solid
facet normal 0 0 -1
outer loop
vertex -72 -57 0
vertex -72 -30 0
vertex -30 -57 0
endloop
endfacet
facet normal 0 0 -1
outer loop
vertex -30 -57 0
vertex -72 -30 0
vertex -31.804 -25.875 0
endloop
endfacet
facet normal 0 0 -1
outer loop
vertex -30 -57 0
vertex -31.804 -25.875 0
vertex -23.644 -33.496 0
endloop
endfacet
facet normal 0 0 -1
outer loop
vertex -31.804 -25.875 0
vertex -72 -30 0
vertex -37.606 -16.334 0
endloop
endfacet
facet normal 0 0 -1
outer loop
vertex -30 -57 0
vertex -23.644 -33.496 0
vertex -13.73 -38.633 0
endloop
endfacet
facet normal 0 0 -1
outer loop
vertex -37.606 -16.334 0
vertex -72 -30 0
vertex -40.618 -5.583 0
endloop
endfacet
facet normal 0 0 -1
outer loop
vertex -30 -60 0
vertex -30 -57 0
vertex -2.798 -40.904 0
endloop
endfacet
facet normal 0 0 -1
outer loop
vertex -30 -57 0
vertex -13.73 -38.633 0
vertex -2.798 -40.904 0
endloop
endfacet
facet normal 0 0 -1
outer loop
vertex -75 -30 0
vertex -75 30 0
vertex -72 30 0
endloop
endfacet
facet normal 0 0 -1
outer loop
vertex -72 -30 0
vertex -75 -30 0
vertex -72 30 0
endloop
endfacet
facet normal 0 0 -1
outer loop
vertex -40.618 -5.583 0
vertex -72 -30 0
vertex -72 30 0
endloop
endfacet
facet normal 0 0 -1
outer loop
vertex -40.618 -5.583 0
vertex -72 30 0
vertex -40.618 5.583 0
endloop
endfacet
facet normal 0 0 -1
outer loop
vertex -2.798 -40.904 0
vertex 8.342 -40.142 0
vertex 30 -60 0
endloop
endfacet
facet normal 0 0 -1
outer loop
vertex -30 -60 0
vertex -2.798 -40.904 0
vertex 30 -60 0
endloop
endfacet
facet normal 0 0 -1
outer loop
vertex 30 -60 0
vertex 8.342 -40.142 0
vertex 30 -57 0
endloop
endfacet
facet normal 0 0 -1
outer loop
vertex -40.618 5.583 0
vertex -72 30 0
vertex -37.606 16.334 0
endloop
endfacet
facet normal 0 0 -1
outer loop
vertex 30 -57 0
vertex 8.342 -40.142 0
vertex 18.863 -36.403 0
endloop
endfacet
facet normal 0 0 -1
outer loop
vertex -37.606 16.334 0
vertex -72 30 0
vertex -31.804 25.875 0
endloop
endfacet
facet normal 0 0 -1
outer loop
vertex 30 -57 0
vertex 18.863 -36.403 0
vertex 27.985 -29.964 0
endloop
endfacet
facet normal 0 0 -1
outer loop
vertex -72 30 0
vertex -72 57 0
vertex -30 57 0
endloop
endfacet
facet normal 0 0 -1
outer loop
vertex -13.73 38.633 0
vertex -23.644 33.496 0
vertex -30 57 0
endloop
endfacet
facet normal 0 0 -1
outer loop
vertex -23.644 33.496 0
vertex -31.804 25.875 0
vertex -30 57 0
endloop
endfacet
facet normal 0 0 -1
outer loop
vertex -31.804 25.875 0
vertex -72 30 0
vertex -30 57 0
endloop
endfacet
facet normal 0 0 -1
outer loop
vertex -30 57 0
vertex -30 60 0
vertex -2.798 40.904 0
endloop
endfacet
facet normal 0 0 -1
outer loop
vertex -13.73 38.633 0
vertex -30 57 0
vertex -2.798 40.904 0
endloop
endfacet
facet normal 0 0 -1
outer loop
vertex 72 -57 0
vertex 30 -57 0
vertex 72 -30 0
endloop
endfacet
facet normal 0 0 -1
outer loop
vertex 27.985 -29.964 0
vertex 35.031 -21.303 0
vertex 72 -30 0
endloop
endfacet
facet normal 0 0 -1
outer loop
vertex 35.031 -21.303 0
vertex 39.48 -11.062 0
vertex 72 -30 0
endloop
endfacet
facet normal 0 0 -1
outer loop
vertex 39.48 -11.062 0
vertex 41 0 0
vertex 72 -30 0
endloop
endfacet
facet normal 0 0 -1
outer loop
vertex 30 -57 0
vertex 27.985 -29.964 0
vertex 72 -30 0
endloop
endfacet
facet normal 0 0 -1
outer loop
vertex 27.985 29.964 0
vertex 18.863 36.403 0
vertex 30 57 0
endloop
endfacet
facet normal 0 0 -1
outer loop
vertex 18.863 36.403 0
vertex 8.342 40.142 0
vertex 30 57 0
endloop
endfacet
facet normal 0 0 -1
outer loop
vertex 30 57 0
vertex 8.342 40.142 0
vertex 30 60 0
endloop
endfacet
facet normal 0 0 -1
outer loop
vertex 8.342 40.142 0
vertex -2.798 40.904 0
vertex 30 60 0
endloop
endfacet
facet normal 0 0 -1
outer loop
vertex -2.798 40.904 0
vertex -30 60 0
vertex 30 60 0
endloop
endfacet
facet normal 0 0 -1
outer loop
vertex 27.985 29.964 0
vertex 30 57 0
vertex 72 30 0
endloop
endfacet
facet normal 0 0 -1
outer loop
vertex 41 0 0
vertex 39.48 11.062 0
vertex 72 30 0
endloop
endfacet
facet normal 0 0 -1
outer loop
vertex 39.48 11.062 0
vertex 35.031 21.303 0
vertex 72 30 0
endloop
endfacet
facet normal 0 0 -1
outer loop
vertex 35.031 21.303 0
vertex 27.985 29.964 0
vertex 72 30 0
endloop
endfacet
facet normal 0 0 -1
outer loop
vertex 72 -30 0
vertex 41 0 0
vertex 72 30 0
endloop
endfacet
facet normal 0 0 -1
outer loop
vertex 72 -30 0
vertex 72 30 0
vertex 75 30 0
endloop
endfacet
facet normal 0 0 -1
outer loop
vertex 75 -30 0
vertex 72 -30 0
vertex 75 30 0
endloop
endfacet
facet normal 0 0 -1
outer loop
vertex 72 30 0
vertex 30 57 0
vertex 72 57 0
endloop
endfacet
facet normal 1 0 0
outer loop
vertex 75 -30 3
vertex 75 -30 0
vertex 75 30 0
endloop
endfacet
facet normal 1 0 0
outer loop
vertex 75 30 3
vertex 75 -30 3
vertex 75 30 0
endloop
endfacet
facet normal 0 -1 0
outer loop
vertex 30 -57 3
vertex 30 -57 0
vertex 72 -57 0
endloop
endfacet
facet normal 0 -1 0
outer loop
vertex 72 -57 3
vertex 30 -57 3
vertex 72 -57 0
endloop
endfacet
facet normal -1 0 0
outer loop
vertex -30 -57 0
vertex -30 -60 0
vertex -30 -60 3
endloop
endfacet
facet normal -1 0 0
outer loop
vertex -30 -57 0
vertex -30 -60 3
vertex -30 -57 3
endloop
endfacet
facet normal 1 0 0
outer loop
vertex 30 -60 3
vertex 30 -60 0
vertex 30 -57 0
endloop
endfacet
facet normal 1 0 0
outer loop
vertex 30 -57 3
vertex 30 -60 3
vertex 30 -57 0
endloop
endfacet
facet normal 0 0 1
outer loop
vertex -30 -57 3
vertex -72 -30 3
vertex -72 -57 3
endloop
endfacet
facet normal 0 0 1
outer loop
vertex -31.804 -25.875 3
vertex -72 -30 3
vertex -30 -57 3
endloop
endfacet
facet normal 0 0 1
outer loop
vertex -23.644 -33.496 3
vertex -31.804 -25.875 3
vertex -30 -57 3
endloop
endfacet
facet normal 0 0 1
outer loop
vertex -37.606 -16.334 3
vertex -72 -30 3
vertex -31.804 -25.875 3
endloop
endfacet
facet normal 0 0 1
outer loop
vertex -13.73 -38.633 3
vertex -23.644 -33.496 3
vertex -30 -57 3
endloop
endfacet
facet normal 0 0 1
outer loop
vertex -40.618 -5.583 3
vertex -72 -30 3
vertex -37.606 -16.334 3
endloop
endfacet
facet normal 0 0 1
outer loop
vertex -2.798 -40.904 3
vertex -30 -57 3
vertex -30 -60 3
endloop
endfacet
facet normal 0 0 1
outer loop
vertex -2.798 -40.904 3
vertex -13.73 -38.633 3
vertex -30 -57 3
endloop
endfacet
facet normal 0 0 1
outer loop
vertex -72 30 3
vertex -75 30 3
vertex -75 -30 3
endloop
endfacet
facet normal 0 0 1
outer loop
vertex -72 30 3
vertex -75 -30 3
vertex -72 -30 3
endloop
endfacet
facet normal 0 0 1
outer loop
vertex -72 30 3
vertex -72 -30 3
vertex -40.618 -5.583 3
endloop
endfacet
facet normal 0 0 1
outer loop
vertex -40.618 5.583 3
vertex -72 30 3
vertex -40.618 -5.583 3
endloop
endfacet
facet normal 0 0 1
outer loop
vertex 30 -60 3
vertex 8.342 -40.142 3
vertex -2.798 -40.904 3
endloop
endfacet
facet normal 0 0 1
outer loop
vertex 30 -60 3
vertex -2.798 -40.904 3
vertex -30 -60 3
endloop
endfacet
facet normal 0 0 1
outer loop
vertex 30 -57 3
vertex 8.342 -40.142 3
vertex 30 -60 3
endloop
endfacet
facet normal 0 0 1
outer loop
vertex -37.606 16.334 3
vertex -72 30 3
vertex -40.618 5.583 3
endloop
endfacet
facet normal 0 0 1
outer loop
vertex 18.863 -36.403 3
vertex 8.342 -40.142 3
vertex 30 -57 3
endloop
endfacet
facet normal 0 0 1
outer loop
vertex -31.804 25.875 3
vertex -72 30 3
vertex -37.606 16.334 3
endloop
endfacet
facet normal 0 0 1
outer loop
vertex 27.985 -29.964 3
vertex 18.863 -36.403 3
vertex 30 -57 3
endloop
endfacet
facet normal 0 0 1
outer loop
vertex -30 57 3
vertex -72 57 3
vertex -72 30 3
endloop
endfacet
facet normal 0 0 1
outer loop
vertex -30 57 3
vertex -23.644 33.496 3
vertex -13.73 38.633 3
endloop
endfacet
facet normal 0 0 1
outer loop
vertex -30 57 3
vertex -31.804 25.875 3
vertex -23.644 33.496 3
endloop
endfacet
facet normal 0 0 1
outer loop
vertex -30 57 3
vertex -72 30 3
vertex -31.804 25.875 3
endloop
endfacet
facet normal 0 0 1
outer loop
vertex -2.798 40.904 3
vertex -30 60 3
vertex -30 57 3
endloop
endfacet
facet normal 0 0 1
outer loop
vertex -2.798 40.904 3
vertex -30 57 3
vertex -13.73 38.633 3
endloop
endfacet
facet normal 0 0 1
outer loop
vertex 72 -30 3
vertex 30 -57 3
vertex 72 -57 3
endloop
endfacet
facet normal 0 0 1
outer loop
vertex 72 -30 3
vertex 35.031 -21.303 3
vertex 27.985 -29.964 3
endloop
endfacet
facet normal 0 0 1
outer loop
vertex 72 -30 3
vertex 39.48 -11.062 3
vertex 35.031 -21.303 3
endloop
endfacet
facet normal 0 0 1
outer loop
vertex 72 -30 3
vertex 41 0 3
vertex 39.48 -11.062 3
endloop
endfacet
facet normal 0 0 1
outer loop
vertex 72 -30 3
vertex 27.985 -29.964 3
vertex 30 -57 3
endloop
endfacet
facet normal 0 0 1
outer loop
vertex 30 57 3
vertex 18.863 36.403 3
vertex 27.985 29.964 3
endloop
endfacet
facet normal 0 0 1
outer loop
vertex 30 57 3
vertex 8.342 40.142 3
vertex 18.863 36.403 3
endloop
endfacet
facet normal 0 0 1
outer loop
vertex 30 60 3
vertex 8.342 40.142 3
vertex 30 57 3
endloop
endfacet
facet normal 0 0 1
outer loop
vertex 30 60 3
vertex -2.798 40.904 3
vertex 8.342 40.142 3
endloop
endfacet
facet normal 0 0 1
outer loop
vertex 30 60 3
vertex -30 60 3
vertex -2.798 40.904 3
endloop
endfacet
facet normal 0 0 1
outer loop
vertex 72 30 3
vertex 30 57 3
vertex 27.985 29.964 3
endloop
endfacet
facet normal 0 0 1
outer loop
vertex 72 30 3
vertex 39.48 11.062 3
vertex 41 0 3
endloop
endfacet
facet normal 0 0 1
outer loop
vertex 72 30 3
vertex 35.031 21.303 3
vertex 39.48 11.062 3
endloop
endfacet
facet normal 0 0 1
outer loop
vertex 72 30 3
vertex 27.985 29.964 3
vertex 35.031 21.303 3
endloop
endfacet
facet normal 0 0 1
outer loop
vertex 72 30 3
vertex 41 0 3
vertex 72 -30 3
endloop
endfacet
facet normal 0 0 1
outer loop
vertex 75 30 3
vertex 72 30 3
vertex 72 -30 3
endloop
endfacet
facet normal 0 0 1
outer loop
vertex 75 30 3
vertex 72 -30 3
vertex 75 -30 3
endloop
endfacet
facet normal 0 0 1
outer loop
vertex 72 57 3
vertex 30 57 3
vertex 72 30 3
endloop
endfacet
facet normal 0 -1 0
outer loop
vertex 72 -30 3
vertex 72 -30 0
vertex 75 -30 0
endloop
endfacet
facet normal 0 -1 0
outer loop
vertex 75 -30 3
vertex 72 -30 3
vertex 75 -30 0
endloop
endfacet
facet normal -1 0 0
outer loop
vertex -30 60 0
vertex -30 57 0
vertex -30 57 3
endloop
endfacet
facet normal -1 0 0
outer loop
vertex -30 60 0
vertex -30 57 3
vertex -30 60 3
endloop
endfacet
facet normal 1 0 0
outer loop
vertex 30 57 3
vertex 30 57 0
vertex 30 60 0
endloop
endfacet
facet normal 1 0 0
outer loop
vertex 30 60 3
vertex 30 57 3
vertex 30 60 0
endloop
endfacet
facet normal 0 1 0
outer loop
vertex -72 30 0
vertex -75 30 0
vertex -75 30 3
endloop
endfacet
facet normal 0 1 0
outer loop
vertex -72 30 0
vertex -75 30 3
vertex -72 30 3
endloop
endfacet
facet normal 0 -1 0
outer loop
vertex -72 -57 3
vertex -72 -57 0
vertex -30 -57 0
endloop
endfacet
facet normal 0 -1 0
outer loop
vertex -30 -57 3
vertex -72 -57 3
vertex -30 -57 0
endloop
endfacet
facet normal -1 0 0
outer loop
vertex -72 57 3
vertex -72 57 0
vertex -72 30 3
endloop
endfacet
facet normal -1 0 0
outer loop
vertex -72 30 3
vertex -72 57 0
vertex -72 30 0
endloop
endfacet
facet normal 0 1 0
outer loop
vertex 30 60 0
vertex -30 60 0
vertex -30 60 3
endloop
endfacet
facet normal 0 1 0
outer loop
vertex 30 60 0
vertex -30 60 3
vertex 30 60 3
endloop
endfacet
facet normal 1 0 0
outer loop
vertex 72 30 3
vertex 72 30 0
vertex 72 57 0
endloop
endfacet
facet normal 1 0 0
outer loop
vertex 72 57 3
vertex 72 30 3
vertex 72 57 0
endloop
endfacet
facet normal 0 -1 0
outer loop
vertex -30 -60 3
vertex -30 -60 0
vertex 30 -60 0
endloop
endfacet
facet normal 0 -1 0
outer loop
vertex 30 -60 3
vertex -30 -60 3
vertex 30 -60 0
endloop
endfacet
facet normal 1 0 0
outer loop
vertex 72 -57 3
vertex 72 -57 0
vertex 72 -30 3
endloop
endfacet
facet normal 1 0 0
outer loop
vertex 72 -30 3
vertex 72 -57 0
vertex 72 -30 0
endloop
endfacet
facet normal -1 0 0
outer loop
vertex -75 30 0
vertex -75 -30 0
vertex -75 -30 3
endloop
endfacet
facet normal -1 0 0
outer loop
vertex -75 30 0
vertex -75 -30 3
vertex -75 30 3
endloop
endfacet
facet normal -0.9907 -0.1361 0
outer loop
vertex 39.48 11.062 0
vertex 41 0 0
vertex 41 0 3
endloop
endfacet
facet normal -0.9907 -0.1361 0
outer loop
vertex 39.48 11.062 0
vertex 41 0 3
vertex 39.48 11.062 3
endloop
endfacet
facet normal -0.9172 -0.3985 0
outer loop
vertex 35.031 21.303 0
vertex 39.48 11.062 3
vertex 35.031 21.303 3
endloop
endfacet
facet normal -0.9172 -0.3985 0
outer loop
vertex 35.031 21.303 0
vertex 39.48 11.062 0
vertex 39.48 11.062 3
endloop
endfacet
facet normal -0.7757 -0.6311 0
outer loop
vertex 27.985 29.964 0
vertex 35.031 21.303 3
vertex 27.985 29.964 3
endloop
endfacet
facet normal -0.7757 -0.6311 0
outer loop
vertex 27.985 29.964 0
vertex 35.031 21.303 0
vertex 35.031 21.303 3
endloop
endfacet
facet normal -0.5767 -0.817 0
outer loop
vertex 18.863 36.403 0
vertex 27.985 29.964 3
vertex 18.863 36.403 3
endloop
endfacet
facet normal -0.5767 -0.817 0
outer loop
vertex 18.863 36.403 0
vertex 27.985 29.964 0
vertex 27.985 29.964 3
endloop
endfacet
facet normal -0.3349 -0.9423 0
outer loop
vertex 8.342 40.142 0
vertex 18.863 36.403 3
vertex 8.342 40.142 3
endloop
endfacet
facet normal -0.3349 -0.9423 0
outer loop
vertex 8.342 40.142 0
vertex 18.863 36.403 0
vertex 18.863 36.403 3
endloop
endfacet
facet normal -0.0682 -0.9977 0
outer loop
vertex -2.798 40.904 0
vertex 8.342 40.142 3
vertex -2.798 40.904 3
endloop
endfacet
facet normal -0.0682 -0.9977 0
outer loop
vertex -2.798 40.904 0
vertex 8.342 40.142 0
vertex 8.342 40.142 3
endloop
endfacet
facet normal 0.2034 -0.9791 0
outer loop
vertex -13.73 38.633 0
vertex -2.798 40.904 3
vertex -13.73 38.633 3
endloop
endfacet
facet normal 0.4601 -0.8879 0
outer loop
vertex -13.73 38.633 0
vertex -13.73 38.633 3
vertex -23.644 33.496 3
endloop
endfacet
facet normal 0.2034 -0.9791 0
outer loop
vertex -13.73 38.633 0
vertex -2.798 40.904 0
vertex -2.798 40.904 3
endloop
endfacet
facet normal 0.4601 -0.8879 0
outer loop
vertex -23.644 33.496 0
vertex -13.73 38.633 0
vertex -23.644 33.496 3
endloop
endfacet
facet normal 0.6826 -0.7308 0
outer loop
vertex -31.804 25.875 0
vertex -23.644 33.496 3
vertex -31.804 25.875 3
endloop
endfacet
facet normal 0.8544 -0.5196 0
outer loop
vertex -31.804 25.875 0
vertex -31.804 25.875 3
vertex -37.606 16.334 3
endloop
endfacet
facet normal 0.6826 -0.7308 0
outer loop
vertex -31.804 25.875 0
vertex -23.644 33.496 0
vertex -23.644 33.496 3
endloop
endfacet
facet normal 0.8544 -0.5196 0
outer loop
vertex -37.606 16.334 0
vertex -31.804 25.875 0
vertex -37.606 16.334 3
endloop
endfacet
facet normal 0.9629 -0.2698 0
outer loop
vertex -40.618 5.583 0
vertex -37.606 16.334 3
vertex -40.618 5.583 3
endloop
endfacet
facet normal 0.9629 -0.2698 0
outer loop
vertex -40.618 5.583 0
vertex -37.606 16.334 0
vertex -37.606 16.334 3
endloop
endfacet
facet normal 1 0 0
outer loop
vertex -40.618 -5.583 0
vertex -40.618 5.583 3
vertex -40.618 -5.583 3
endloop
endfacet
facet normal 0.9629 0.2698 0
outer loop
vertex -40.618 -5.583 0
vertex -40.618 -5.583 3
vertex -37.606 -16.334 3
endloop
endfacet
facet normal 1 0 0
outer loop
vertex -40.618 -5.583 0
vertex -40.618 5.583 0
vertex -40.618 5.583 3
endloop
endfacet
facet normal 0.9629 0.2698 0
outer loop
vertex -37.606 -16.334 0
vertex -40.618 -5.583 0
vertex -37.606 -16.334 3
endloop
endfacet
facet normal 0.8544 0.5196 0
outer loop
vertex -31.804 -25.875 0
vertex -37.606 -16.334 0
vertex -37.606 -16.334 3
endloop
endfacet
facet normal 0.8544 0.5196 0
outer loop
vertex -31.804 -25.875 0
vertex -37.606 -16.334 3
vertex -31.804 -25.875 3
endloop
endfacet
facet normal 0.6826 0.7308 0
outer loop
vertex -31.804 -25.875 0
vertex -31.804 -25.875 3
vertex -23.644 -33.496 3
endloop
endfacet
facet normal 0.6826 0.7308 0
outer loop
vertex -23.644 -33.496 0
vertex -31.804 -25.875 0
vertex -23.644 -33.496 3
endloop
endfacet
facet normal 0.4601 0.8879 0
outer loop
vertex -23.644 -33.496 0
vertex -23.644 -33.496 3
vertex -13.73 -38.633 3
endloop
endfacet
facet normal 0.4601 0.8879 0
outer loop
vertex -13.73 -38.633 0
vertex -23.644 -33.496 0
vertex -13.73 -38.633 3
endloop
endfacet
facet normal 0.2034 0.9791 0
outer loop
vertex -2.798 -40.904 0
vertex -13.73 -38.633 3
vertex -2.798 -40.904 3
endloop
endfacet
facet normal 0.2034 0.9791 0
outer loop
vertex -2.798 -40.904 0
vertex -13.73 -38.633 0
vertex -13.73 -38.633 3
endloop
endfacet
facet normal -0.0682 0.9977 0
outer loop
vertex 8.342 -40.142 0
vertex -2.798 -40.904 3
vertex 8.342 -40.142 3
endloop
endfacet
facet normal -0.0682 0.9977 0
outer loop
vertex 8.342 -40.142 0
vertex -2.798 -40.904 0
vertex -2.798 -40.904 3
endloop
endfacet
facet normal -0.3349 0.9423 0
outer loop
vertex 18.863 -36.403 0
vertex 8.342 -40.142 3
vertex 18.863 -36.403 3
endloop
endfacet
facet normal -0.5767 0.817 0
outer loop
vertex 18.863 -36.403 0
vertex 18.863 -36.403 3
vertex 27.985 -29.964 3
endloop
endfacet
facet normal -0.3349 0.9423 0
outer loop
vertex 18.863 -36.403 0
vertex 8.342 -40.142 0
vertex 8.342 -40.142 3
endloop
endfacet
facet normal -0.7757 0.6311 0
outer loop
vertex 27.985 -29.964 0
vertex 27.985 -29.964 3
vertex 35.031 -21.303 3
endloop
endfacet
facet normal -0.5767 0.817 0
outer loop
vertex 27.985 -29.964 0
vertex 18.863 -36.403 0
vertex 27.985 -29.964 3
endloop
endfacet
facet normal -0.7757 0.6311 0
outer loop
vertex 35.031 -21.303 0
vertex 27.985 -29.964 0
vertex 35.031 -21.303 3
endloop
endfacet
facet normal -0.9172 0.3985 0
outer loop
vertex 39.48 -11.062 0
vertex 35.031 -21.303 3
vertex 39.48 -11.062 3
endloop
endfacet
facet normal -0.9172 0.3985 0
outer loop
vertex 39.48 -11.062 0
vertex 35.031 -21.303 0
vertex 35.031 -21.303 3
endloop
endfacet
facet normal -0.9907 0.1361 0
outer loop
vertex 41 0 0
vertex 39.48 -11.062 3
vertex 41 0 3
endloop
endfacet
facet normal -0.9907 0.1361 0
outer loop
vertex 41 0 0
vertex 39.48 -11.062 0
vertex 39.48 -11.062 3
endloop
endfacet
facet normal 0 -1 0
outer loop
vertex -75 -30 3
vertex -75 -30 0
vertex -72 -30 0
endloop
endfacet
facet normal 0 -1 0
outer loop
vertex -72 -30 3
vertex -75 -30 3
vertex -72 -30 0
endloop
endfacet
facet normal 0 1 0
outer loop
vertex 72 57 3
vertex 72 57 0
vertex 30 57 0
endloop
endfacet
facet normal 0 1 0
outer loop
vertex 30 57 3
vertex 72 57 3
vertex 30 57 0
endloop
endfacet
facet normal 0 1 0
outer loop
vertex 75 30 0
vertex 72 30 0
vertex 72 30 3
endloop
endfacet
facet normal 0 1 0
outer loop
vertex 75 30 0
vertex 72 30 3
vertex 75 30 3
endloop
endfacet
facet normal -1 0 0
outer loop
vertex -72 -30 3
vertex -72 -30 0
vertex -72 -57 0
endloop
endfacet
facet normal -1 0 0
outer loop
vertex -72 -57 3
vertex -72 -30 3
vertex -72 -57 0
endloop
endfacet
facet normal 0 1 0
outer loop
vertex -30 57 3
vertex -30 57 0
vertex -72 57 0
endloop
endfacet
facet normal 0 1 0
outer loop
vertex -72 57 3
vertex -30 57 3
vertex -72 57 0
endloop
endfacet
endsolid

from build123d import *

# Parameters (mm, degrees)
F0_R     = 41
F0_W     = 60
F0_H     = 3
F0_W_2   = 3
F0_H_2   = 60
F1_DEPTH = 3


with BuildPart() as f1:
    # F0 (on Top) → F1 (new body)
    with BuildSketch(Plane.XY):
        Polygon((72, 30), (72, 57), (30, 57), (-30, 57), (-72, 57), (-72, 30), (-72, -30), (-72, -57), (-30, -57), (30, -57), (72, -57), (72, -30), align=None)
        Circle(F0_R, mode=Mode.SUBTRACT)
        with Locations((0, 58.5)):
            Rectangle(F0_W, F0_H)
        with Locations((73.5, 0)):
            Rectangle(F0_W_2, F0_H_2)
        with Locations((-73.5, 0)):
            Rectangle(F0_W_2, F0_H_2)
        with Locations((0, -58.5)):
            Rectangle(F0_W, F0_H)
    extrude(amount=F1_DEPTH)


solid = f1.part
